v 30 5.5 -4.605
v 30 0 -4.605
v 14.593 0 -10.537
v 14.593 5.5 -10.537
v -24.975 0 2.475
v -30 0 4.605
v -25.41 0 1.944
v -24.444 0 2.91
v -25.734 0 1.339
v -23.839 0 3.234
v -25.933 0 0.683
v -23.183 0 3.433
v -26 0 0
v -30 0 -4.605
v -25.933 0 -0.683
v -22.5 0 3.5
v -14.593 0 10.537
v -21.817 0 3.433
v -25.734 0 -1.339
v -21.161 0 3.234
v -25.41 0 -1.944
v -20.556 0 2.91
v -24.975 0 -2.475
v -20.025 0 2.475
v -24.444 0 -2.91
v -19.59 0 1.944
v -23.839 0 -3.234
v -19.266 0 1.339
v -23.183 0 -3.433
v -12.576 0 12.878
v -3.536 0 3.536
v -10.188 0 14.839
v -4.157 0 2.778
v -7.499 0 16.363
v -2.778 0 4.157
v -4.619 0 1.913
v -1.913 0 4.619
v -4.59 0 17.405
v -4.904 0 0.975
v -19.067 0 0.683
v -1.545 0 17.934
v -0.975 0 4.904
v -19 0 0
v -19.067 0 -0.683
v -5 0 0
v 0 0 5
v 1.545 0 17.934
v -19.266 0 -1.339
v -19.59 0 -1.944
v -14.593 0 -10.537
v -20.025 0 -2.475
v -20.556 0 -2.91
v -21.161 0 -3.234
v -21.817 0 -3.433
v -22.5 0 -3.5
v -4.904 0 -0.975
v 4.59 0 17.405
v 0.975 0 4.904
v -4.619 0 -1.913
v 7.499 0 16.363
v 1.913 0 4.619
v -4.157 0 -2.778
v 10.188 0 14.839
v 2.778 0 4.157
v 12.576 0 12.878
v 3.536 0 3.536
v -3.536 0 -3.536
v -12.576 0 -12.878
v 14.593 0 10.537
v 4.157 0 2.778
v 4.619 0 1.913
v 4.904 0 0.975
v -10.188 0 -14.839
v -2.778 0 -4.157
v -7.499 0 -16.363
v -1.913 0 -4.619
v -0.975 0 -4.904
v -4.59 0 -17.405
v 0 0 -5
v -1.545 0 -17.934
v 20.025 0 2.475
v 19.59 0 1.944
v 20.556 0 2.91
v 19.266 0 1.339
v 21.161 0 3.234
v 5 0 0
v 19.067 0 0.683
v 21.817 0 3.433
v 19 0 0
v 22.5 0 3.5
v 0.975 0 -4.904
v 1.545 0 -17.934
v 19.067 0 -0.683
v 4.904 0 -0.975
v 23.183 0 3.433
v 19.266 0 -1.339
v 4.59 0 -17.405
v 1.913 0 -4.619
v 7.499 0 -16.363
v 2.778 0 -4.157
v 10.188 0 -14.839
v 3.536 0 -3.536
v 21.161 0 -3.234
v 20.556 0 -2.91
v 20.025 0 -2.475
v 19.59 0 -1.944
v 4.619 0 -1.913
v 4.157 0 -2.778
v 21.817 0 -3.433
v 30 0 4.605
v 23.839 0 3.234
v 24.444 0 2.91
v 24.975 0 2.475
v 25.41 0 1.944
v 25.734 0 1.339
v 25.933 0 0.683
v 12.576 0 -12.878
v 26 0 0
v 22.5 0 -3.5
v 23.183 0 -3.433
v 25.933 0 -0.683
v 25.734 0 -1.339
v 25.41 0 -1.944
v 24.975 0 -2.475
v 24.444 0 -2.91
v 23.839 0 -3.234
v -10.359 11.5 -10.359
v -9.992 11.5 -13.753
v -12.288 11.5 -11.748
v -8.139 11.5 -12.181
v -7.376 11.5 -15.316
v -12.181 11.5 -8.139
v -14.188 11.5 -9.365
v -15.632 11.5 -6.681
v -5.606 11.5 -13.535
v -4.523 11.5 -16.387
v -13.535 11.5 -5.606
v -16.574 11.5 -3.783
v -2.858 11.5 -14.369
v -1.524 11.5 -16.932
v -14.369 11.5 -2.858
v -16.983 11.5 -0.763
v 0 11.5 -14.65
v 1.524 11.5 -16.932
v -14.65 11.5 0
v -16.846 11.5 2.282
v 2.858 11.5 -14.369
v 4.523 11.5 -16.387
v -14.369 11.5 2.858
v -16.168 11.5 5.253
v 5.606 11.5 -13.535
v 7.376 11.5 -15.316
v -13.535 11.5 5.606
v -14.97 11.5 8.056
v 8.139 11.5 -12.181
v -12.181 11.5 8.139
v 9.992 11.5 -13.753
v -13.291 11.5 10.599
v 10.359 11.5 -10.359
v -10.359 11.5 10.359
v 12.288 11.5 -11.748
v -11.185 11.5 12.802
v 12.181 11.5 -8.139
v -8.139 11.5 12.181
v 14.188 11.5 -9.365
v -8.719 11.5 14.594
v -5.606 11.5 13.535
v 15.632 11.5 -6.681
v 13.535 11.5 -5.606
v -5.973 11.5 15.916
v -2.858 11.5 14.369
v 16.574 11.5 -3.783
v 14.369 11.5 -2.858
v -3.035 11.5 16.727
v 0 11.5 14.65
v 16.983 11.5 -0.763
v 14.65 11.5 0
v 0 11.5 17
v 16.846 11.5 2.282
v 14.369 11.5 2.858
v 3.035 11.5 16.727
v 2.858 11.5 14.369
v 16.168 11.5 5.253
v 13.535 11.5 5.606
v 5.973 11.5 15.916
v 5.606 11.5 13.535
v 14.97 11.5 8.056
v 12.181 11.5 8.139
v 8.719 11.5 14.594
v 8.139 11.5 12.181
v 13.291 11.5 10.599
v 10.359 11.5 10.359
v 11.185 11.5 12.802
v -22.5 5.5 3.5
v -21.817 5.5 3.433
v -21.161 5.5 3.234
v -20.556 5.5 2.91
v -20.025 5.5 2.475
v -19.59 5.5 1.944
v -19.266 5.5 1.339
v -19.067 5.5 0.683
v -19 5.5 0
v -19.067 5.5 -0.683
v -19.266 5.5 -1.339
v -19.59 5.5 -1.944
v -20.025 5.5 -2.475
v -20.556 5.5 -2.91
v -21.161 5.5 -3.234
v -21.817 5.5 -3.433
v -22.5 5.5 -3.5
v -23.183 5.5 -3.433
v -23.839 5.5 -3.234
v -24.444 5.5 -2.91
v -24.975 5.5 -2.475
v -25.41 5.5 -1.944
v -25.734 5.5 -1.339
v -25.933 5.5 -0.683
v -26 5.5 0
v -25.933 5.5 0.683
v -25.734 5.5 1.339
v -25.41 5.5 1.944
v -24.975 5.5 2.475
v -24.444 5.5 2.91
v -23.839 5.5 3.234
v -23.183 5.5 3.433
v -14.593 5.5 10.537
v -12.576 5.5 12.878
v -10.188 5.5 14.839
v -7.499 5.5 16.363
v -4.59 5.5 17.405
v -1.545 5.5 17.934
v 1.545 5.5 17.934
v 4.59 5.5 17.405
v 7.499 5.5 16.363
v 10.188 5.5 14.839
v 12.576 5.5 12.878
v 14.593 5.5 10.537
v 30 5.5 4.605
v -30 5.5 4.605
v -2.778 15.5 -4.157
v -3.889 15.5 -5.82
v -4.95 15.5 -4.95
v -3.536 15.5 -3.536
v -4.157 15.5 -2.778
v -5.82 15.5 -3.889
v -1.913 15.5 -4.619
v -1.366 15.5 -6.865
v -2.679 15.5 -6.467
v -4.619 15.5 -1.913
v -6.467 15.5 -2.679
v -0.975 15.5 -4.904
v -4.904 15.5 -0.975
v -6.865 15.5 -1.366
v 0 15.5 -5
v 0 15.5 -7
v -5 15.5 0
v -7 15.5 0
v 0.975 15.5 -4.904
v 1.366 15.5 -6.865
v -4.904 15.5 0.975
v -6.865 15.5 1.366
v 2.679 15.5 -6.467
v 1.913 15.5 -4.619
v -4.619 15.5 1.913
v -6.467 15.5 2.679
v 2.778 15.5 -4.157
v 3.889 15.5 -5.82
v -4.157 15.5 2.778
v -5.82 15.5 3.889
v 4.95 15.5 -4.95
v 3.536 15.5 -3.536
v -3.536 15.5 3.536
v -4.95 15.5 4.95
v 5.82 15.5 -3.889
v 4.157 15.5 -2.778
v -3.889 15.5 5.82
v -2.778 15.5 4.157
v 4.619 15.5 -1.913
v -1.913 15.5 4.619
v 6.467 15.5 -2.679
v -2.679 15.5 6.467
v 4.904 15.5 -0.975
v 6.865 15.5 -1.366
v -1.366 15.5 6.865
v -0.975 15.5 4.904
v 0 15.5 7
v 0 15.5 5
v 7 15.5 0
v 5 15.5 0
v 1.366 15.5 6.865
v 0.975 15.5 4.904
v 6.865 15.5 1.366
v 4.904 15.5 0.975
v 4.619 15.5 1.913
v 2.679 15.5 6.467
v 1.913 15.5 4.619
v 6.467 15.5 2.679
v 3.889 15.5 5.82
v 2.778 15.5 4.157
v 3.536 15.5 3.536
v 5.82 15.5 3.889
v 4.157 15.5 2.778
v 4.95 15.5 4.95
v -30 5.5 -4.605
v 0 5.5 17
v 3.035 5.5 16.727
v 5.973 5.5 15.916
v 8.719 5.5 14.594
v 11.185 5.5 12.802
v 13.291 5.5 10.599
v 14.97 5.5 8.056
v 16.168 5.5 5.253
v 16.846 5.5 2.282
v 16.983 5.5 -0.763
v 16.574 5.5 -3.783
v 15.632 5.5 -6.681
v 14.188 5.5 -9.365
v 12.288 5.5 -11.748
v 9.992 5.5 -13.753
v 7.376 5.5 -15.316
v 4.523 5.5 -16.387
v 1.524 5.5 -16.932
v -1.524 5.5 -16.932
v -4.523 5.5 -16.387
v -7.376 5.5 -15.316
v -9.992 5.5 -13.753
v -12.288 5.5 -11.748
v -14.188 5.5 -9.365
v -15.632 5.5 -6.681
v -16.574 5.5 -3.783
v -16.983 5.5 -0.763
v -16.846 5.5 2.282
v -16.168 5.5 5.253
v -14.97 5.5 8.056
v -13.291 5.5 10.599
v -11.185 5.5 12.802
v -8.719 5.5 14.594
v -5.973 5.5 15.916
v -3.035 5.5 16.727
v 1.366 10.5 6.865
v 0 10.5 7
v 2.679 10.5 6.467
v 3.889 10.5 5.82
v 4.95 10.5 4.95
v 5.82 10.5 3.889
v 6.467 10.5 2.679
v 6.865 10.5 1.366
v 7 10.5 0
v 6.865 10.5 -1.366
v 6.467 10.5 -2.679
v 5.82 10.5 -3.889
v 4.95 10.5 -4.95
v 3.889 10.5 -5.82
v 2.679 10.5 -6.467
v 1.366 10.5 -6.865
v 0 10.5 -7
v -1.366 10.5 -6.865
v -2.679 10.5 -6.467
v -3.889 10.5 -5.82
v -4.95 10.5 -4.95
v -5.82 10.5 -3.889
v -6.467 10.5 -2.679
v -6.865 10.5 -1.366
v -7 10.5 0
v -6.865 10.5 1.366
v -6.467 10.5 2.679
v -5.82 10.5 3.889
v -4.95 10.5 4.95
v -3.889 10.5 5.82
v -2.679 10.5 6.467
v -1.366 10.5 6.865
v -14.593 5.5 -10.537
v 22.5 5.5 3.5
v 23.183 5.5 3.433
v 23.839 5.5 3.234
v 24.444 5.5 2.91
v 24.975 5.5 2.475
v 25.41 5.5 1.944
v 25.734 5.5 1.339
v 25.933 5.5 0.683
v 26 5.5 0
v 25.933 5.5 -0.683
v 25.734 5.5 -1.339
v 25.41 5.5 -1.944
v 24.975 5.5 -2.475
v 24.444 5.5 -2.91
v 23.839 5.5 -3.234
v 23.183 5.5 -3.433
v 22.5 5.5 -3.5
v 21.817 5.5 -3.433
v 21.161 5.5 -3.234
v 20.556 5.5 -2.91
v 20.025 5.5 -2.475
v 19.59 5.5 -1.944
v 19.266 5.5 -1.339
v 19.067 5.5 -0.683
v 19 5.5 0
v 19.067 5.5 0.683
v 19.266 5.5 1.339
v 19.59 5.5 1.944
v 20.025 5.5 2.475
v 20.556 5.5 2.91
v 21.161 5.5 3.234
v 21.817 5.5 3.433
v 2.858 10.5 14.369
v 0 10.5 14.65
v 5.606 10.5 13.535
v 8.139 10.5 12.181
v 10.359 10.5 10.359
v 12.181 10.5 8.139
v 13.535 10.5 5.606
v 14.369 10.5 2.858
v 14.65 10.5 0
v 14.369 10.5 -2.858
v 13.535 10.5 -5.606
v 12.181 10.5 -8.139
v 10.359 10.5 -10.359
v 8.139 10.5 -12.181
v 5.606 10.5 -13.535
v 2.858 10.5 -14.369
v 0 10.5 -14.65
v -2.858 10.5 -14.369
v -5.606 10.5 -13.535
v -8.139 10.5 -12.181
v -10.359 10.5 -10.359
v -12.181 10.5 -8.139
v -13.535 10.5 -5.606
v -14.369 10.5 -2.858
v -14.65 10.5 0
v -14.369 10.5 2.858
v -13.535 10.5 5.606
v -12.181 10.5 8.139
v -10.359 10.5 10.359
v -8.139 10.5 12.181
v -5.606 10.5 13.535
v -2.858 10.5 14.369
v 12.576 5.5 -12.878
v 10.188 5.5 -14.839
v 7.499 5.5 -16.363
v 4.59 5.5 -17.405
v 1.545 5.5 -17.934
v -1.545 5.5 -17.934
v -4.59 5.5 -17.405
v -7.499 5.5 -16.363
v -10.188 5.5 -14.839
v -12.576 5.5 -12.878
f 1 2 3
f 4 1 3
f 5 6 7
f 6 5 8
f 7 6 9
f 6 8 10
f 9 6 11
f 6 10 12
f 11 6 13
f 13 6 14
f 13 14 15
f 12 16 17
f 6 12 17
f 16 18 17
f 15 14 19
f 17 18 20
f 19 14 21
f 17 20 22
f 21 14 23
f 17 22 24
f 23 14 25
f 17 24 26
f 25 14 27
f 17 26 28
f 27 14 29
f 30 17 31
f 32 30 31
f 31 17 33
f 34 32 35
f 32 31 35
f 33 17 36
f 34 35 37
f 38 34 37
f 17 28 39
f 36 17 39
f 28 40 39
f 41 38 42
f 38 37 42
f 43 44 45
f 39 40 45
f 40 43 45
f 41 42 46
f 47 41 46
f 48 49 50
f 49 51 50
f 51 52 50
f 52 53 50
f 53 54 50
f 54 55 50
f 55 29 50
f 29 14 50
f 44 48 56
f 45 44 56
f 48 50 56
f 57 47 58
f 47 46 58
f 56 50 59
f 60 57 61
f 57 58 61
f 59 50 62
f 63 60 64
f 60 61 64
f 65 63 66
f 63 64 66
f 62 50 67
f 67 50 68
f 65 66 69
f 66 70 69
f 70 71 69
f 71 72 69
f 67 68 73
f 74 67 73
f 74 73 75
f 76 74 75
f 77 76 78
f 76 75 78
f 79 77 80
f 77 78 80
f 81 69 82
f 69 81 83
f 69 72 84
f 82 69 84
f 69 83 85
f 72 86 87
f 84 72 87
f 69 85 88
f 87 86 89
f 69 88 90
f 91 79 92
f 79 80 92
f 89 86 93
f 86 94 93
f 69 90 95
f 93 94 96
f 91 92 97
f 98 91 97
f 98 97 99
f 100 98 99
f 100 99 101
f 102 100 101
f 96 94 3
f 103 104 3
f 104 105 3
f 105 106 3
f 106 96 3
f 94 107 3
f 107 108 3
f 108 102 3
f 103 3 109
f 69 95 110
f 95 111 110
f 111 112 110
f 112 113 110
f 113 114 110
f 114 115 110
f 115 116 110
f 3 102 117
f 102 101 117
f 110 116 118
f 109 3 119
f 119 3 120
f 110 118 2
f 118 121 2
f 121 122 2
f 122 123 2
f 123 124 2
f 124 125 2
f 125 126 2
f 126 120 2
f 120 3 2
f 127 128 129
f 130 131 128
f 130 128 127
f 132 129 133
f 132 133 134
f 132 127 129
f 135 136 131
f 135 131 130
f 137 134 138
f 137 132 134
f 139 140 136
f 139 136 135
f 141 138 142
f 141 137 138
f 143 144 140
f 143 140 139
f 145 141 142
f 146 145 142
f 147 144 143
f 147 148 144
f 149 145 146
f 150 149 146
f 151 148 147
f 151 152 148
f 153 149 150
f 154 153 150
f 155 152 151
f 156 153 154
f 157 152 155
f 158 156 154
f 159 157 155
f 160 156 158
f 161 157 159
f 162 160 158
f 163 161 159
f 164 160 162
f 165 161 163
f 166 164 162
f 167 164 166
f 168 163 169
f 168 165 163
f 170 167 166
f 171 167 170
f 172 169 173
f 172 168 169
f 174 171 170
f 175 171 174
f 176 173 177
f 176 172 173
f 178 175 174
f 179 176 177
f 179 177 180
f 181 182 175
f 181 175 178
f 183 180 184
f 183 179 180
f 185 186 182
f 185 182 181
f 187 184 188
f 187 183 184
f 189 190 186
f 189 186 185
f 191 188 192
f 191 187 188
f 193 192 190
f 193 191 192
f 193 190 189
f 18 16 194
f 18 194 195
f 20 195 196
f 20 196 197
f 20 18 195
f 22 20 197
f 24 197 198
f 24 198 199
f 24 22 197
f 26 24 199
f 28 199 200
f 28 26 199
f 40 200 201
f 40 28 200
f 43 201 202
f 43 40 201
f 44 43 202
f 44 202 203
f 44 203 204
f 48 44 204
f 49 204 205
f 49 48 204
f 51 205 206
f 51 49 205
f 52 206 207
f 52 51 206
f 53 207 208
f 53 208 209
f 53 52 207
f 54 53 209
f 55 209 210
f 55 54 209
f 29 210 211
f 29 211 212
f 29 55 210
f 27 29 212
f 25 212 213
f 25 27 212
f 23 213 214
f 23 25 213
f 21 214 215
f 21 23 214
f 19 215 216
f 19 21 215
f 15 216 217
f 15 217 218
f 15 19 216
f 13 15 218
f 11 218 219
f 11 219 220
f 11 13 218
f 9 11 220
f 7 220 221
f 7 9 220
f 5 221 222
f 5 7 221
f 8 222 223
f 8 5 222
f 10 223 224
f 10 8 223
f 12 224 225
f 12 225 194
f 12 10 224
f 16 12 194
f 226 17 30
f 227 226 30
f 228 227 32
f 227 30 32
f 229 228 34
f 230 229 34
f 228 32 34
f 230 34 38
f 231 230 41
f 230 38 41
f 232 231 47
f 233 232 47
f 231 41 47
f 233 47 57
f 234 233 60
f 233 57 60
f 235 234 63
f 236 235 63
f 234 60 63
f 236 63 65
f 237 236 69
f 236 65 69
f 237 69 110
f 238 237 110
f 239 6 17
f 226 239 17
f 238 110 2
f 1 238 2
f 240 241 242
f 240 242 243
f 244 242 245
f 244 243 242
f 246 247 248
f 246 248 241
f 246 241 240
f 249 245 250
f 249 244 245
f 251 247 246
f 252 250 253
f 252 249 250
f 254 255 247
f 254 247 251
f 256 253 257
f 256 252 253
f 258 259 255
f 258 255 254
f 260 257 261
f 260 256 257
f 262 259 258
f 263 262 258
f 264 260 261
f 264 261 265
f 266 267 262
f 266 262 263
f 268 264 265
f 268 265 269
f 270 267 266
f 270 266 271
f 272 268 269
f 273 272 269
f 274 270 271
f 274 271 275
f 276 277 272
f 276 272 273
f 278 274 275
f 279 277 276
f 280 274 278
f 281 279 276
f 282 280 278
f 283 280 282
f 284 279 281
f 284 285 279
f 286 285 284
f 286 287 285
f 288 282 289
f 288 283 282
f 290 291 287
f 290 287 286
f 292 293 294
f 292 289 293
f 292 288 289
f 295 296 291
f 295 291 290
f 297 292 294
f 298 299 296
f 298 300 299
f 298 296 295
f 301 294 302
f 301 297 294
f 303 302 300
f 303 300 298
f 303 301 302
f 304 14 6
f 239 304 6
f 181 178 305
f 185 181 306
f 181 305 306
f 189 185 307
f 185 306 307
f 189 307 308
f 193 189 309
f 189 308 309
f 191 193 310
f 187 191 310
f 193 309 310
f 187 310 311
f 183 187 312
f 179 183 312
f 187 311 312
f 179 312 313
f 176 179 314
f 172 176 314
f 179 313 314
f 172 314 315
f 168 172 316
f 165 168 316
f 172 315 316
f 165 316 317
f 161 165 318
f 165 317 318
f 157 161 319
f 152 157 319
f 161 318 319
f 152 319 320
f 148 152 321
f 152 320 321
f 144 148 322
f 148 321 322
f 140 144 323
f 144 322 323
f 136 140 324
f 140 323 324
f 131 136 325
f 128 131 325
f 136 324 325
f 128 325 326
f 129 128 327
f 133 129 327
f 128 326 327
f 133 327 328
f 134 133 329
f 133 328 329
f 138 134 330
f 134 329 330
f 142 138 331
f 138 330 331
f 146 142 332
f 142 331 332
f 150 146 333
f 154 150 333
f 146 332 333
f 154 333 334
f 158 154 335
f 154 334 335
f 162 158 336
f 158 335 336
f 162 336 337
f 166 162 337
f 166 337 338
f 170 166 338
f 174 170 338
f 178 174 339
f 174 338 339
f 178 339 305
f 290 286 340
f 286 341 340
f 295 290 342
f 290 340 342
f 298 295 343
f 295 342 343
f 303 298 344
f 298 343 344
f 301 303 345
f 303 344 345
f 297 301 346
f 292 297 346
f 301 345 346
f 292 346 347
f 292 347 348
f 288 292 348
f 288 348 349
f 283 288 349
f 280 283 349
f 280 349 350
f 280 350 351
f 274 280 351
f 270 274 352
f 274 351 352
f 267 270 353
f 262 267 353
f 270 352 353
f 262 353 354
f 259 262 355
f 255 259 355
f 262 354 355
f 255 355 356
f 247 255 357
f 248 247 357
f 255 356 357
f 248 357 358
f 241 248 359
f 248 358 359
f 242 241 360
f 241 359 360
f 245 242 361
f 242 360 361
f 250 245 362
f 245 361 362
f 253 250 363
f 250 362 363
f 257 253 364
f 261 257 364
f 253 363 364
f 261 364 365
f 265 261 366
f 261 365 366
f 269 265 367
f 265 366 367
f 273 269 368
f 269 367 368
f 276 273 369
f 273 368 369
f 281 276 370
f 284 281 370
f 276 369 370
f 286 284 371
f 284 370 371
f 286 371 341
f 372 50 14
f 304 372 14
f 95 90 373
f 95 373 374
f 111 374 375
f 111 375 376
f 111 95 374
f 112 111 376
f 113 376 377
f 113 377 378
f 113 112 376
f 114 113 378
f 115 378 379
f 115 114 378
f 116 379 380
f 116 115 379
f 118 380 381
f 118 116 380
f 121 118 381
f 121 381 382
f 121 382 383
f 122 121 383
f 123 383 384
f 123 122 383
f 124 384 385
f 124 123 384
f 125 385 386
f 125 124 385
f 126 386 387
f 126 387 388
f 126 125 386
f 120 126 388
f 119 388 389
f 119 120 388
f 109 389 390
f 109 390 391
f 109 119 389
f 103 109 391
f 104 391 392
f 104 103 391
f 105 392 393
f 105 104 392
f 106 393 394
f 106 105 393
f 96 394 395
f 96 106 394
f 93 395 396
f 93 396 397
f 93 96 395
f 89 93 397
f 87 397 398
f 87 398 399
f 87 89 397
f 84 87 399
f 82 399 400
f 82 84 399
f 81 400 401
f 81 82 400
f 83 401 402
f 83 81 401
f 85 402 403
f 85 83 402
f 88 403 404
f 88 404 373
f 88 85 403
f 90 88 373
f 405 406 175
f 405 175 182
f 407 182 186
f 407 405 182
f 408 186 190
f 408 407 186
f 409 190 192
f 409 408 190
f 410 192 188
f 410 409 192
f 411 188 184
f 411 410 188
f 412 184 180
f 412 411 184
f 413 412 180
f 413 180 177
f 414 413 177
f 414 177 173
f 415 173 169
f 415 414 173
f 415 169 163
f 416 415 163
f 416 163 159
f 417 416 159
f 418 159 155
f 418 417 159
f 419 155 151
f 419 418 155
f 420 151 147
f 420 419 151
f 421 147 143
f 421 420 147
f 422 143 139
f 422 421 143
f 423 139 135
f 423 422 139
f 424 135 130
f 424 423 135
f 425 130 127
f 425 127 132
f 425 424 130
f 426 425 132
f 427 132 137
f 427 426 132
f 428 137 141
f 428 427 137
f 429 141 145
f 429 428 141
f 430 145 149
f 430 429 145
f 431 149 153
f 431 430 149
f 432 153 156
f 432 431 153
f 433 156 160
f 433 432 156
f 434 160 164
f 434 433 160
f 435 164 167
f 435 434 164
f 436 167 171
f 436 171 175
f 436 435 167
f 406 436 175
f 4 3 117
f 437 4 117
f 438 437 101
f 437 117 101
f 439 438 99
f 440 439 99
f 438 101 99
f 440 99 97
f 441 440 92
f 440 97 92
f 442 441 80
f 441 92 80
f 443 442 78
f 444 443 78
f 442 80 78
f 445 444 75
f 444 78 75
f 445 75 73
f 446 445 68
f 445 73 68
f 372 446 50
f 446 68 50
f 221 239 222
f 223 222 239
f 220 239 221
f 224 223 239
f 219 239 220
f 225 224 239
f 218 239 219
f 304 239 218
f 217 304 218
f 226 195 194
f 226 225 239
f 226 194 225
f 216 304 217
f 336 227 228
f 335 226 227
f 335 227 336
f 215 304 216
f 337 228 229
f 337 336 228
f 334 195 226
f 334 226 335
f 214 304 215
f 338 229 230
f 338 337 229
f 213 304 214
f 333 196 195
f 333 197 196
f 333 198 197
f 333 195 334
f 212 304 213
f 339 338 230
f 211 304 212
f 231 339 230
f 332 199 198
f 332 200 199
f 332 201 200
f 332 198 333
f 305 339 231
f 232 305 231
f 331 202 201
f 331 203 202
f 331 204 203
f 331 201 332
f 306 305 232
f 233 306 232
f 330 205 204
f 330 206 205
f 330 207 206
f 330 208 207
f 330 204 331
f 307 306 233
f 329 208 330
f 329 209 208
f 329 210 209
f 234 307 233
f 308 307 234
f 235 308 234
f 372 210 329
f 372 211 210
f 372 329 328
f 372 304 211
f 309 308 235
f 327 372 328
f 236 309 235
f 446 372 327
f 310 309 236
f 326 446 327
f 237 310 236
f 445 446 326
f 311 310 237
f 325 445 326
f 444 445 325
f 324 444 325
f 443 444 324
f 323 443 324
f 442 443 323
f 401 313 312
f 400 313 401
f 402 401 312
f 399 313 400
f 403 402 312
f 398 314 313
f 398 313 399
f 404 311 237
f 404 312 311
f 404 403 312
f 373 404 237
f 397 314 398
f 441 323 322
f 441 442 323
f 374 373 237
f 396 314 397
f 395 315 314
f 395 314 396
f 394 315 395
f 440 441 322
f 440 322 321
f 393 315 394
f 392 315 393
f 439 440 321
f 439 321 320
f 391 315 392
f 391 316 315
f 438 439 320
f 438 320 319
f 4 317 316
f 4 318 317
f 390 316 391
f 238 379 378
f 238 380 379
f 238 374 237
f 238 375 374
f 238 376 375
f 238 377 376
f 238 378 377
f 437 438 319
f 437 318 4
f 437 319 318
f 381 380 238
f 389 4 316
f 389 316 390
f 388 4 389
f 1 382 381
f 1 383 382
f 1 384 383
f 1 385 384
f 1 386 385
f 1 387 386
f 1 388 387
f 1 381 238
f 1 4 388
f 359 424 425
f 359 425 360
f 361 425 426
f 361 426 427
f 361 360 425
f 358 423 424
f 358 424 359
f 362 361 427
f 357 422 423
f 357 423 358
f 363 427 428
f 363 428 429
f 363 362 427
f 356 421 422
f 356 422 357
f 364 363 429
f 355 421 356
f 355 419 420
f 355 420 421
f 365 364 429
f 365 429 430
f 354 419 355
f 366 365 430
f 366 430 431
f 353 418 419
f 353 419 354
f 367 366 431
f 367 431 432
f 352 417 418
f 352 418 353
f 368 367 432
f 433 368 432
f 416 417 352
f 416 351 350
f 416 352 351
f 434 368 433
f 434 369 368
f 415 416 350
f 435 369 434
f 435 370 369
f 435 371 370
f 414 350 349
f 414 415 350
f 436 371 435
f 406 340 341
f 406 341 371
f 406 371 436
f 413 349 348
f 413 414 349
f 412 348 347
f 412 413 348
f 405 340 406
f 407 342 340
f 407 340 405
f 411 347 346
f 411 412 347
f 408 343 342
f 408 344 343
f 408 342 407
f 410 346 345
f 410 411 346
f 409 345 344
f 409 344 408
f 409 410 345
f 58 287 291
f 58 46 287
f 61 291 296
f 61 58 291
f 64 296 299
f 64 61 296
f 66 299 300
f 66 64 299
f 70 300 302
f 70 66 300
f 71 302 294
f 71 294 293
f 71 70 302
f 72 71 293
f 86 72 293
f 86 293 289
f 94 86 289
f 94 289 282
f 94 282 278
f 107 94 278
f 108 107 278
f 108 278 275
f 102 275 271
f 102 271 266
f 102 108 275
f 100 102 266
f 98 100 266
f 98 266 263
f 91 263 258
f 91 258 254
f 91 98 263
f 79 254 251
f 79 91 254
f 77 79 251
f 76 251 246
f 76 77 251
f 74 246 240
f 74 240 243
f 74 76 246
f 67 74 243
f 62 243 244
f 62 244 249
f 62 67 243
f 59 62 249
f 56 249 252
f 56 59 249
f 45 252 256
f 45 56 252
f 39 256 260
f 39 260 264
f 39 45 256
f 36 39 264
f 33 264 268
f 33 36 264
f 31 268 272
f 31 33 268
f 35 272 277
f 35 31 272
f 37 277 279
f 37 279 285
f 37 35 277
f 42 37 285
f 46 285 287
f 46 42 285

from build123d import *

# Parameters (mm, degrees)
SKETCH_1_R          = 3.5
SKETCH_1_R_2        = 18
SKETCH_1_R_3        = 5
EXTRUDE_1_DEPTH     = 5.5
SKETCH_2_R          = 17
SKETCH_2_R_2        = 5
EXTRUDE_2_DEPTH     = 6
SKETCH_3_R          = 7
SKETCH_3_R_2        = 5
EXTRUDE_3_DEPTH     = 4
CUT_EXTRUDE_START   = -1
SKETCH_4_R          = 14.65
SKETCH_4_R_2        = 7
CUT_EXTRUDE_1_DEPTH = 1


with BuildPart() as part:
    # 草图1 → 凸台-拉伸1 (new body)
    # profile 1 of 3: a face of its own
    with BuildSketch(Plane(origin=(0, 0, 0), x_dir=(1, 0, 0), z_dir=(0, 1, 0))):
        with BuildLine():
            Line((-14.5934987, 10.537067699), (-30, 4.60495562))
            Line((-30, 4.60495562), (-30, -4.60495562))
            Line((-30, -4.60495562), (-14.5934987, -10.537067699))
            ThreePointArc((-14.5934987, -10.537067699), (-18, 0), (-14.5934987, 10.537067699))
        make_face()
        with Locations(Location((-22.5, 0, 0), (0, 0, 270))):
            Circle(SKETCH_1_R, mode=Mode.SUBTRACT)
    # profile 2 of 3: a face of its own
    with BuildSketch(Plane(origin=(0, 0, 0), x_dir=(1, 0, 0), z_dir=(0, 1, 0))):
        Circle(SKETCH_1_R_2)
        with Locations(Location((0, 0, 0), (0, 0, 270))):
            Circle(SKETCH_1_R_3, mode=Mode.SUBTRACT)
    # profile 3 of 3: a face of its own
    with BuildSketch(Plane(origin=(0, 0, 0), x_dir=(1, 0, 0), z_dir=(0, 1, 0))):
        with BuildLine():
            Line((30, 4.60495562), (14.5934987, 10.537067699))
            ThreePointArc((14.5934987, 10.537067699), (17.127214844, 5.537012886), (18, 0))
            ThreePointArc((18, 0), (17.127214844, -5.537012886), (14.5934987, -10.537067699))
            Line((14.5934987, -10.537067699), (30, -4.60495562))
            Line((30, -4.60495562), (30, 4.60495562))
        make_face()
        with Locations(Location((22.5, 0, 0), (0, 0, 270))):
            Circle(SKETCH_1_R, mode=Mode.SUBTRACT)
    extrude(amount=EXTRUDE_1_DEPTH)

    # 草图2 → 凸台-拉伸2 (add)
    with BuildSketch(Plane(origin=(0, 5.5, 0), x_dir=(1, 0, 0), z_dir=(0, 1, 0))):
        with Locations(Location((0, 0, 0), (0, 0, 270))):
            Circle(SKETCH_2_R)
        with Locations(Location((0, 0, 0), (0, 0, 270))):
            Circle(SKETCH_2_R_2, mode=Mode.SUBTRACT)
    extrude(amount=EXTRUDE_2_DEPTH)

    # 草图3 → 凸台-拉伸3 (add)
    with BuildSketch(Plane(origin=(0, 11.5, 0), x_dir=(1, 0, 0), z_dir=(0, 1, 0))):
        with Locations(Location((0, 0, 0), (0, 0, 270))):
            Circle(SKETCH_3_R)
        with Locations(Location((0, 0, 0), (0, 0, 270))):
            Circle(SKETCH_3_R_2, mode=Mode.SUBTRACT)
    extrude(amount=EXTRUDE_3_DEPTH)

    # 草图4 → 切除-拉伸1 (cut)
    with BuildSketch(Plane(origin=(0, 11.5, 0), x_dir=(1, 0, 0), z_dir=(0, 1, 0)).offset(CUT_EXTRUDE_START)):
        with Locations(Location((0, 0, 0), (0, 0, 270))):
            Circle(SKETCH_4_R)
        with Locations(Location((0, 0, 0), (0, 0, 270))):
            Circle(SKETCH_4_R_2, mode=Mode.SUBTRACT)
    extrude(amount=CUT_EXTRUDE_1_DEPTH, mode=Mode.SUBTRACT)


solid = part.part
